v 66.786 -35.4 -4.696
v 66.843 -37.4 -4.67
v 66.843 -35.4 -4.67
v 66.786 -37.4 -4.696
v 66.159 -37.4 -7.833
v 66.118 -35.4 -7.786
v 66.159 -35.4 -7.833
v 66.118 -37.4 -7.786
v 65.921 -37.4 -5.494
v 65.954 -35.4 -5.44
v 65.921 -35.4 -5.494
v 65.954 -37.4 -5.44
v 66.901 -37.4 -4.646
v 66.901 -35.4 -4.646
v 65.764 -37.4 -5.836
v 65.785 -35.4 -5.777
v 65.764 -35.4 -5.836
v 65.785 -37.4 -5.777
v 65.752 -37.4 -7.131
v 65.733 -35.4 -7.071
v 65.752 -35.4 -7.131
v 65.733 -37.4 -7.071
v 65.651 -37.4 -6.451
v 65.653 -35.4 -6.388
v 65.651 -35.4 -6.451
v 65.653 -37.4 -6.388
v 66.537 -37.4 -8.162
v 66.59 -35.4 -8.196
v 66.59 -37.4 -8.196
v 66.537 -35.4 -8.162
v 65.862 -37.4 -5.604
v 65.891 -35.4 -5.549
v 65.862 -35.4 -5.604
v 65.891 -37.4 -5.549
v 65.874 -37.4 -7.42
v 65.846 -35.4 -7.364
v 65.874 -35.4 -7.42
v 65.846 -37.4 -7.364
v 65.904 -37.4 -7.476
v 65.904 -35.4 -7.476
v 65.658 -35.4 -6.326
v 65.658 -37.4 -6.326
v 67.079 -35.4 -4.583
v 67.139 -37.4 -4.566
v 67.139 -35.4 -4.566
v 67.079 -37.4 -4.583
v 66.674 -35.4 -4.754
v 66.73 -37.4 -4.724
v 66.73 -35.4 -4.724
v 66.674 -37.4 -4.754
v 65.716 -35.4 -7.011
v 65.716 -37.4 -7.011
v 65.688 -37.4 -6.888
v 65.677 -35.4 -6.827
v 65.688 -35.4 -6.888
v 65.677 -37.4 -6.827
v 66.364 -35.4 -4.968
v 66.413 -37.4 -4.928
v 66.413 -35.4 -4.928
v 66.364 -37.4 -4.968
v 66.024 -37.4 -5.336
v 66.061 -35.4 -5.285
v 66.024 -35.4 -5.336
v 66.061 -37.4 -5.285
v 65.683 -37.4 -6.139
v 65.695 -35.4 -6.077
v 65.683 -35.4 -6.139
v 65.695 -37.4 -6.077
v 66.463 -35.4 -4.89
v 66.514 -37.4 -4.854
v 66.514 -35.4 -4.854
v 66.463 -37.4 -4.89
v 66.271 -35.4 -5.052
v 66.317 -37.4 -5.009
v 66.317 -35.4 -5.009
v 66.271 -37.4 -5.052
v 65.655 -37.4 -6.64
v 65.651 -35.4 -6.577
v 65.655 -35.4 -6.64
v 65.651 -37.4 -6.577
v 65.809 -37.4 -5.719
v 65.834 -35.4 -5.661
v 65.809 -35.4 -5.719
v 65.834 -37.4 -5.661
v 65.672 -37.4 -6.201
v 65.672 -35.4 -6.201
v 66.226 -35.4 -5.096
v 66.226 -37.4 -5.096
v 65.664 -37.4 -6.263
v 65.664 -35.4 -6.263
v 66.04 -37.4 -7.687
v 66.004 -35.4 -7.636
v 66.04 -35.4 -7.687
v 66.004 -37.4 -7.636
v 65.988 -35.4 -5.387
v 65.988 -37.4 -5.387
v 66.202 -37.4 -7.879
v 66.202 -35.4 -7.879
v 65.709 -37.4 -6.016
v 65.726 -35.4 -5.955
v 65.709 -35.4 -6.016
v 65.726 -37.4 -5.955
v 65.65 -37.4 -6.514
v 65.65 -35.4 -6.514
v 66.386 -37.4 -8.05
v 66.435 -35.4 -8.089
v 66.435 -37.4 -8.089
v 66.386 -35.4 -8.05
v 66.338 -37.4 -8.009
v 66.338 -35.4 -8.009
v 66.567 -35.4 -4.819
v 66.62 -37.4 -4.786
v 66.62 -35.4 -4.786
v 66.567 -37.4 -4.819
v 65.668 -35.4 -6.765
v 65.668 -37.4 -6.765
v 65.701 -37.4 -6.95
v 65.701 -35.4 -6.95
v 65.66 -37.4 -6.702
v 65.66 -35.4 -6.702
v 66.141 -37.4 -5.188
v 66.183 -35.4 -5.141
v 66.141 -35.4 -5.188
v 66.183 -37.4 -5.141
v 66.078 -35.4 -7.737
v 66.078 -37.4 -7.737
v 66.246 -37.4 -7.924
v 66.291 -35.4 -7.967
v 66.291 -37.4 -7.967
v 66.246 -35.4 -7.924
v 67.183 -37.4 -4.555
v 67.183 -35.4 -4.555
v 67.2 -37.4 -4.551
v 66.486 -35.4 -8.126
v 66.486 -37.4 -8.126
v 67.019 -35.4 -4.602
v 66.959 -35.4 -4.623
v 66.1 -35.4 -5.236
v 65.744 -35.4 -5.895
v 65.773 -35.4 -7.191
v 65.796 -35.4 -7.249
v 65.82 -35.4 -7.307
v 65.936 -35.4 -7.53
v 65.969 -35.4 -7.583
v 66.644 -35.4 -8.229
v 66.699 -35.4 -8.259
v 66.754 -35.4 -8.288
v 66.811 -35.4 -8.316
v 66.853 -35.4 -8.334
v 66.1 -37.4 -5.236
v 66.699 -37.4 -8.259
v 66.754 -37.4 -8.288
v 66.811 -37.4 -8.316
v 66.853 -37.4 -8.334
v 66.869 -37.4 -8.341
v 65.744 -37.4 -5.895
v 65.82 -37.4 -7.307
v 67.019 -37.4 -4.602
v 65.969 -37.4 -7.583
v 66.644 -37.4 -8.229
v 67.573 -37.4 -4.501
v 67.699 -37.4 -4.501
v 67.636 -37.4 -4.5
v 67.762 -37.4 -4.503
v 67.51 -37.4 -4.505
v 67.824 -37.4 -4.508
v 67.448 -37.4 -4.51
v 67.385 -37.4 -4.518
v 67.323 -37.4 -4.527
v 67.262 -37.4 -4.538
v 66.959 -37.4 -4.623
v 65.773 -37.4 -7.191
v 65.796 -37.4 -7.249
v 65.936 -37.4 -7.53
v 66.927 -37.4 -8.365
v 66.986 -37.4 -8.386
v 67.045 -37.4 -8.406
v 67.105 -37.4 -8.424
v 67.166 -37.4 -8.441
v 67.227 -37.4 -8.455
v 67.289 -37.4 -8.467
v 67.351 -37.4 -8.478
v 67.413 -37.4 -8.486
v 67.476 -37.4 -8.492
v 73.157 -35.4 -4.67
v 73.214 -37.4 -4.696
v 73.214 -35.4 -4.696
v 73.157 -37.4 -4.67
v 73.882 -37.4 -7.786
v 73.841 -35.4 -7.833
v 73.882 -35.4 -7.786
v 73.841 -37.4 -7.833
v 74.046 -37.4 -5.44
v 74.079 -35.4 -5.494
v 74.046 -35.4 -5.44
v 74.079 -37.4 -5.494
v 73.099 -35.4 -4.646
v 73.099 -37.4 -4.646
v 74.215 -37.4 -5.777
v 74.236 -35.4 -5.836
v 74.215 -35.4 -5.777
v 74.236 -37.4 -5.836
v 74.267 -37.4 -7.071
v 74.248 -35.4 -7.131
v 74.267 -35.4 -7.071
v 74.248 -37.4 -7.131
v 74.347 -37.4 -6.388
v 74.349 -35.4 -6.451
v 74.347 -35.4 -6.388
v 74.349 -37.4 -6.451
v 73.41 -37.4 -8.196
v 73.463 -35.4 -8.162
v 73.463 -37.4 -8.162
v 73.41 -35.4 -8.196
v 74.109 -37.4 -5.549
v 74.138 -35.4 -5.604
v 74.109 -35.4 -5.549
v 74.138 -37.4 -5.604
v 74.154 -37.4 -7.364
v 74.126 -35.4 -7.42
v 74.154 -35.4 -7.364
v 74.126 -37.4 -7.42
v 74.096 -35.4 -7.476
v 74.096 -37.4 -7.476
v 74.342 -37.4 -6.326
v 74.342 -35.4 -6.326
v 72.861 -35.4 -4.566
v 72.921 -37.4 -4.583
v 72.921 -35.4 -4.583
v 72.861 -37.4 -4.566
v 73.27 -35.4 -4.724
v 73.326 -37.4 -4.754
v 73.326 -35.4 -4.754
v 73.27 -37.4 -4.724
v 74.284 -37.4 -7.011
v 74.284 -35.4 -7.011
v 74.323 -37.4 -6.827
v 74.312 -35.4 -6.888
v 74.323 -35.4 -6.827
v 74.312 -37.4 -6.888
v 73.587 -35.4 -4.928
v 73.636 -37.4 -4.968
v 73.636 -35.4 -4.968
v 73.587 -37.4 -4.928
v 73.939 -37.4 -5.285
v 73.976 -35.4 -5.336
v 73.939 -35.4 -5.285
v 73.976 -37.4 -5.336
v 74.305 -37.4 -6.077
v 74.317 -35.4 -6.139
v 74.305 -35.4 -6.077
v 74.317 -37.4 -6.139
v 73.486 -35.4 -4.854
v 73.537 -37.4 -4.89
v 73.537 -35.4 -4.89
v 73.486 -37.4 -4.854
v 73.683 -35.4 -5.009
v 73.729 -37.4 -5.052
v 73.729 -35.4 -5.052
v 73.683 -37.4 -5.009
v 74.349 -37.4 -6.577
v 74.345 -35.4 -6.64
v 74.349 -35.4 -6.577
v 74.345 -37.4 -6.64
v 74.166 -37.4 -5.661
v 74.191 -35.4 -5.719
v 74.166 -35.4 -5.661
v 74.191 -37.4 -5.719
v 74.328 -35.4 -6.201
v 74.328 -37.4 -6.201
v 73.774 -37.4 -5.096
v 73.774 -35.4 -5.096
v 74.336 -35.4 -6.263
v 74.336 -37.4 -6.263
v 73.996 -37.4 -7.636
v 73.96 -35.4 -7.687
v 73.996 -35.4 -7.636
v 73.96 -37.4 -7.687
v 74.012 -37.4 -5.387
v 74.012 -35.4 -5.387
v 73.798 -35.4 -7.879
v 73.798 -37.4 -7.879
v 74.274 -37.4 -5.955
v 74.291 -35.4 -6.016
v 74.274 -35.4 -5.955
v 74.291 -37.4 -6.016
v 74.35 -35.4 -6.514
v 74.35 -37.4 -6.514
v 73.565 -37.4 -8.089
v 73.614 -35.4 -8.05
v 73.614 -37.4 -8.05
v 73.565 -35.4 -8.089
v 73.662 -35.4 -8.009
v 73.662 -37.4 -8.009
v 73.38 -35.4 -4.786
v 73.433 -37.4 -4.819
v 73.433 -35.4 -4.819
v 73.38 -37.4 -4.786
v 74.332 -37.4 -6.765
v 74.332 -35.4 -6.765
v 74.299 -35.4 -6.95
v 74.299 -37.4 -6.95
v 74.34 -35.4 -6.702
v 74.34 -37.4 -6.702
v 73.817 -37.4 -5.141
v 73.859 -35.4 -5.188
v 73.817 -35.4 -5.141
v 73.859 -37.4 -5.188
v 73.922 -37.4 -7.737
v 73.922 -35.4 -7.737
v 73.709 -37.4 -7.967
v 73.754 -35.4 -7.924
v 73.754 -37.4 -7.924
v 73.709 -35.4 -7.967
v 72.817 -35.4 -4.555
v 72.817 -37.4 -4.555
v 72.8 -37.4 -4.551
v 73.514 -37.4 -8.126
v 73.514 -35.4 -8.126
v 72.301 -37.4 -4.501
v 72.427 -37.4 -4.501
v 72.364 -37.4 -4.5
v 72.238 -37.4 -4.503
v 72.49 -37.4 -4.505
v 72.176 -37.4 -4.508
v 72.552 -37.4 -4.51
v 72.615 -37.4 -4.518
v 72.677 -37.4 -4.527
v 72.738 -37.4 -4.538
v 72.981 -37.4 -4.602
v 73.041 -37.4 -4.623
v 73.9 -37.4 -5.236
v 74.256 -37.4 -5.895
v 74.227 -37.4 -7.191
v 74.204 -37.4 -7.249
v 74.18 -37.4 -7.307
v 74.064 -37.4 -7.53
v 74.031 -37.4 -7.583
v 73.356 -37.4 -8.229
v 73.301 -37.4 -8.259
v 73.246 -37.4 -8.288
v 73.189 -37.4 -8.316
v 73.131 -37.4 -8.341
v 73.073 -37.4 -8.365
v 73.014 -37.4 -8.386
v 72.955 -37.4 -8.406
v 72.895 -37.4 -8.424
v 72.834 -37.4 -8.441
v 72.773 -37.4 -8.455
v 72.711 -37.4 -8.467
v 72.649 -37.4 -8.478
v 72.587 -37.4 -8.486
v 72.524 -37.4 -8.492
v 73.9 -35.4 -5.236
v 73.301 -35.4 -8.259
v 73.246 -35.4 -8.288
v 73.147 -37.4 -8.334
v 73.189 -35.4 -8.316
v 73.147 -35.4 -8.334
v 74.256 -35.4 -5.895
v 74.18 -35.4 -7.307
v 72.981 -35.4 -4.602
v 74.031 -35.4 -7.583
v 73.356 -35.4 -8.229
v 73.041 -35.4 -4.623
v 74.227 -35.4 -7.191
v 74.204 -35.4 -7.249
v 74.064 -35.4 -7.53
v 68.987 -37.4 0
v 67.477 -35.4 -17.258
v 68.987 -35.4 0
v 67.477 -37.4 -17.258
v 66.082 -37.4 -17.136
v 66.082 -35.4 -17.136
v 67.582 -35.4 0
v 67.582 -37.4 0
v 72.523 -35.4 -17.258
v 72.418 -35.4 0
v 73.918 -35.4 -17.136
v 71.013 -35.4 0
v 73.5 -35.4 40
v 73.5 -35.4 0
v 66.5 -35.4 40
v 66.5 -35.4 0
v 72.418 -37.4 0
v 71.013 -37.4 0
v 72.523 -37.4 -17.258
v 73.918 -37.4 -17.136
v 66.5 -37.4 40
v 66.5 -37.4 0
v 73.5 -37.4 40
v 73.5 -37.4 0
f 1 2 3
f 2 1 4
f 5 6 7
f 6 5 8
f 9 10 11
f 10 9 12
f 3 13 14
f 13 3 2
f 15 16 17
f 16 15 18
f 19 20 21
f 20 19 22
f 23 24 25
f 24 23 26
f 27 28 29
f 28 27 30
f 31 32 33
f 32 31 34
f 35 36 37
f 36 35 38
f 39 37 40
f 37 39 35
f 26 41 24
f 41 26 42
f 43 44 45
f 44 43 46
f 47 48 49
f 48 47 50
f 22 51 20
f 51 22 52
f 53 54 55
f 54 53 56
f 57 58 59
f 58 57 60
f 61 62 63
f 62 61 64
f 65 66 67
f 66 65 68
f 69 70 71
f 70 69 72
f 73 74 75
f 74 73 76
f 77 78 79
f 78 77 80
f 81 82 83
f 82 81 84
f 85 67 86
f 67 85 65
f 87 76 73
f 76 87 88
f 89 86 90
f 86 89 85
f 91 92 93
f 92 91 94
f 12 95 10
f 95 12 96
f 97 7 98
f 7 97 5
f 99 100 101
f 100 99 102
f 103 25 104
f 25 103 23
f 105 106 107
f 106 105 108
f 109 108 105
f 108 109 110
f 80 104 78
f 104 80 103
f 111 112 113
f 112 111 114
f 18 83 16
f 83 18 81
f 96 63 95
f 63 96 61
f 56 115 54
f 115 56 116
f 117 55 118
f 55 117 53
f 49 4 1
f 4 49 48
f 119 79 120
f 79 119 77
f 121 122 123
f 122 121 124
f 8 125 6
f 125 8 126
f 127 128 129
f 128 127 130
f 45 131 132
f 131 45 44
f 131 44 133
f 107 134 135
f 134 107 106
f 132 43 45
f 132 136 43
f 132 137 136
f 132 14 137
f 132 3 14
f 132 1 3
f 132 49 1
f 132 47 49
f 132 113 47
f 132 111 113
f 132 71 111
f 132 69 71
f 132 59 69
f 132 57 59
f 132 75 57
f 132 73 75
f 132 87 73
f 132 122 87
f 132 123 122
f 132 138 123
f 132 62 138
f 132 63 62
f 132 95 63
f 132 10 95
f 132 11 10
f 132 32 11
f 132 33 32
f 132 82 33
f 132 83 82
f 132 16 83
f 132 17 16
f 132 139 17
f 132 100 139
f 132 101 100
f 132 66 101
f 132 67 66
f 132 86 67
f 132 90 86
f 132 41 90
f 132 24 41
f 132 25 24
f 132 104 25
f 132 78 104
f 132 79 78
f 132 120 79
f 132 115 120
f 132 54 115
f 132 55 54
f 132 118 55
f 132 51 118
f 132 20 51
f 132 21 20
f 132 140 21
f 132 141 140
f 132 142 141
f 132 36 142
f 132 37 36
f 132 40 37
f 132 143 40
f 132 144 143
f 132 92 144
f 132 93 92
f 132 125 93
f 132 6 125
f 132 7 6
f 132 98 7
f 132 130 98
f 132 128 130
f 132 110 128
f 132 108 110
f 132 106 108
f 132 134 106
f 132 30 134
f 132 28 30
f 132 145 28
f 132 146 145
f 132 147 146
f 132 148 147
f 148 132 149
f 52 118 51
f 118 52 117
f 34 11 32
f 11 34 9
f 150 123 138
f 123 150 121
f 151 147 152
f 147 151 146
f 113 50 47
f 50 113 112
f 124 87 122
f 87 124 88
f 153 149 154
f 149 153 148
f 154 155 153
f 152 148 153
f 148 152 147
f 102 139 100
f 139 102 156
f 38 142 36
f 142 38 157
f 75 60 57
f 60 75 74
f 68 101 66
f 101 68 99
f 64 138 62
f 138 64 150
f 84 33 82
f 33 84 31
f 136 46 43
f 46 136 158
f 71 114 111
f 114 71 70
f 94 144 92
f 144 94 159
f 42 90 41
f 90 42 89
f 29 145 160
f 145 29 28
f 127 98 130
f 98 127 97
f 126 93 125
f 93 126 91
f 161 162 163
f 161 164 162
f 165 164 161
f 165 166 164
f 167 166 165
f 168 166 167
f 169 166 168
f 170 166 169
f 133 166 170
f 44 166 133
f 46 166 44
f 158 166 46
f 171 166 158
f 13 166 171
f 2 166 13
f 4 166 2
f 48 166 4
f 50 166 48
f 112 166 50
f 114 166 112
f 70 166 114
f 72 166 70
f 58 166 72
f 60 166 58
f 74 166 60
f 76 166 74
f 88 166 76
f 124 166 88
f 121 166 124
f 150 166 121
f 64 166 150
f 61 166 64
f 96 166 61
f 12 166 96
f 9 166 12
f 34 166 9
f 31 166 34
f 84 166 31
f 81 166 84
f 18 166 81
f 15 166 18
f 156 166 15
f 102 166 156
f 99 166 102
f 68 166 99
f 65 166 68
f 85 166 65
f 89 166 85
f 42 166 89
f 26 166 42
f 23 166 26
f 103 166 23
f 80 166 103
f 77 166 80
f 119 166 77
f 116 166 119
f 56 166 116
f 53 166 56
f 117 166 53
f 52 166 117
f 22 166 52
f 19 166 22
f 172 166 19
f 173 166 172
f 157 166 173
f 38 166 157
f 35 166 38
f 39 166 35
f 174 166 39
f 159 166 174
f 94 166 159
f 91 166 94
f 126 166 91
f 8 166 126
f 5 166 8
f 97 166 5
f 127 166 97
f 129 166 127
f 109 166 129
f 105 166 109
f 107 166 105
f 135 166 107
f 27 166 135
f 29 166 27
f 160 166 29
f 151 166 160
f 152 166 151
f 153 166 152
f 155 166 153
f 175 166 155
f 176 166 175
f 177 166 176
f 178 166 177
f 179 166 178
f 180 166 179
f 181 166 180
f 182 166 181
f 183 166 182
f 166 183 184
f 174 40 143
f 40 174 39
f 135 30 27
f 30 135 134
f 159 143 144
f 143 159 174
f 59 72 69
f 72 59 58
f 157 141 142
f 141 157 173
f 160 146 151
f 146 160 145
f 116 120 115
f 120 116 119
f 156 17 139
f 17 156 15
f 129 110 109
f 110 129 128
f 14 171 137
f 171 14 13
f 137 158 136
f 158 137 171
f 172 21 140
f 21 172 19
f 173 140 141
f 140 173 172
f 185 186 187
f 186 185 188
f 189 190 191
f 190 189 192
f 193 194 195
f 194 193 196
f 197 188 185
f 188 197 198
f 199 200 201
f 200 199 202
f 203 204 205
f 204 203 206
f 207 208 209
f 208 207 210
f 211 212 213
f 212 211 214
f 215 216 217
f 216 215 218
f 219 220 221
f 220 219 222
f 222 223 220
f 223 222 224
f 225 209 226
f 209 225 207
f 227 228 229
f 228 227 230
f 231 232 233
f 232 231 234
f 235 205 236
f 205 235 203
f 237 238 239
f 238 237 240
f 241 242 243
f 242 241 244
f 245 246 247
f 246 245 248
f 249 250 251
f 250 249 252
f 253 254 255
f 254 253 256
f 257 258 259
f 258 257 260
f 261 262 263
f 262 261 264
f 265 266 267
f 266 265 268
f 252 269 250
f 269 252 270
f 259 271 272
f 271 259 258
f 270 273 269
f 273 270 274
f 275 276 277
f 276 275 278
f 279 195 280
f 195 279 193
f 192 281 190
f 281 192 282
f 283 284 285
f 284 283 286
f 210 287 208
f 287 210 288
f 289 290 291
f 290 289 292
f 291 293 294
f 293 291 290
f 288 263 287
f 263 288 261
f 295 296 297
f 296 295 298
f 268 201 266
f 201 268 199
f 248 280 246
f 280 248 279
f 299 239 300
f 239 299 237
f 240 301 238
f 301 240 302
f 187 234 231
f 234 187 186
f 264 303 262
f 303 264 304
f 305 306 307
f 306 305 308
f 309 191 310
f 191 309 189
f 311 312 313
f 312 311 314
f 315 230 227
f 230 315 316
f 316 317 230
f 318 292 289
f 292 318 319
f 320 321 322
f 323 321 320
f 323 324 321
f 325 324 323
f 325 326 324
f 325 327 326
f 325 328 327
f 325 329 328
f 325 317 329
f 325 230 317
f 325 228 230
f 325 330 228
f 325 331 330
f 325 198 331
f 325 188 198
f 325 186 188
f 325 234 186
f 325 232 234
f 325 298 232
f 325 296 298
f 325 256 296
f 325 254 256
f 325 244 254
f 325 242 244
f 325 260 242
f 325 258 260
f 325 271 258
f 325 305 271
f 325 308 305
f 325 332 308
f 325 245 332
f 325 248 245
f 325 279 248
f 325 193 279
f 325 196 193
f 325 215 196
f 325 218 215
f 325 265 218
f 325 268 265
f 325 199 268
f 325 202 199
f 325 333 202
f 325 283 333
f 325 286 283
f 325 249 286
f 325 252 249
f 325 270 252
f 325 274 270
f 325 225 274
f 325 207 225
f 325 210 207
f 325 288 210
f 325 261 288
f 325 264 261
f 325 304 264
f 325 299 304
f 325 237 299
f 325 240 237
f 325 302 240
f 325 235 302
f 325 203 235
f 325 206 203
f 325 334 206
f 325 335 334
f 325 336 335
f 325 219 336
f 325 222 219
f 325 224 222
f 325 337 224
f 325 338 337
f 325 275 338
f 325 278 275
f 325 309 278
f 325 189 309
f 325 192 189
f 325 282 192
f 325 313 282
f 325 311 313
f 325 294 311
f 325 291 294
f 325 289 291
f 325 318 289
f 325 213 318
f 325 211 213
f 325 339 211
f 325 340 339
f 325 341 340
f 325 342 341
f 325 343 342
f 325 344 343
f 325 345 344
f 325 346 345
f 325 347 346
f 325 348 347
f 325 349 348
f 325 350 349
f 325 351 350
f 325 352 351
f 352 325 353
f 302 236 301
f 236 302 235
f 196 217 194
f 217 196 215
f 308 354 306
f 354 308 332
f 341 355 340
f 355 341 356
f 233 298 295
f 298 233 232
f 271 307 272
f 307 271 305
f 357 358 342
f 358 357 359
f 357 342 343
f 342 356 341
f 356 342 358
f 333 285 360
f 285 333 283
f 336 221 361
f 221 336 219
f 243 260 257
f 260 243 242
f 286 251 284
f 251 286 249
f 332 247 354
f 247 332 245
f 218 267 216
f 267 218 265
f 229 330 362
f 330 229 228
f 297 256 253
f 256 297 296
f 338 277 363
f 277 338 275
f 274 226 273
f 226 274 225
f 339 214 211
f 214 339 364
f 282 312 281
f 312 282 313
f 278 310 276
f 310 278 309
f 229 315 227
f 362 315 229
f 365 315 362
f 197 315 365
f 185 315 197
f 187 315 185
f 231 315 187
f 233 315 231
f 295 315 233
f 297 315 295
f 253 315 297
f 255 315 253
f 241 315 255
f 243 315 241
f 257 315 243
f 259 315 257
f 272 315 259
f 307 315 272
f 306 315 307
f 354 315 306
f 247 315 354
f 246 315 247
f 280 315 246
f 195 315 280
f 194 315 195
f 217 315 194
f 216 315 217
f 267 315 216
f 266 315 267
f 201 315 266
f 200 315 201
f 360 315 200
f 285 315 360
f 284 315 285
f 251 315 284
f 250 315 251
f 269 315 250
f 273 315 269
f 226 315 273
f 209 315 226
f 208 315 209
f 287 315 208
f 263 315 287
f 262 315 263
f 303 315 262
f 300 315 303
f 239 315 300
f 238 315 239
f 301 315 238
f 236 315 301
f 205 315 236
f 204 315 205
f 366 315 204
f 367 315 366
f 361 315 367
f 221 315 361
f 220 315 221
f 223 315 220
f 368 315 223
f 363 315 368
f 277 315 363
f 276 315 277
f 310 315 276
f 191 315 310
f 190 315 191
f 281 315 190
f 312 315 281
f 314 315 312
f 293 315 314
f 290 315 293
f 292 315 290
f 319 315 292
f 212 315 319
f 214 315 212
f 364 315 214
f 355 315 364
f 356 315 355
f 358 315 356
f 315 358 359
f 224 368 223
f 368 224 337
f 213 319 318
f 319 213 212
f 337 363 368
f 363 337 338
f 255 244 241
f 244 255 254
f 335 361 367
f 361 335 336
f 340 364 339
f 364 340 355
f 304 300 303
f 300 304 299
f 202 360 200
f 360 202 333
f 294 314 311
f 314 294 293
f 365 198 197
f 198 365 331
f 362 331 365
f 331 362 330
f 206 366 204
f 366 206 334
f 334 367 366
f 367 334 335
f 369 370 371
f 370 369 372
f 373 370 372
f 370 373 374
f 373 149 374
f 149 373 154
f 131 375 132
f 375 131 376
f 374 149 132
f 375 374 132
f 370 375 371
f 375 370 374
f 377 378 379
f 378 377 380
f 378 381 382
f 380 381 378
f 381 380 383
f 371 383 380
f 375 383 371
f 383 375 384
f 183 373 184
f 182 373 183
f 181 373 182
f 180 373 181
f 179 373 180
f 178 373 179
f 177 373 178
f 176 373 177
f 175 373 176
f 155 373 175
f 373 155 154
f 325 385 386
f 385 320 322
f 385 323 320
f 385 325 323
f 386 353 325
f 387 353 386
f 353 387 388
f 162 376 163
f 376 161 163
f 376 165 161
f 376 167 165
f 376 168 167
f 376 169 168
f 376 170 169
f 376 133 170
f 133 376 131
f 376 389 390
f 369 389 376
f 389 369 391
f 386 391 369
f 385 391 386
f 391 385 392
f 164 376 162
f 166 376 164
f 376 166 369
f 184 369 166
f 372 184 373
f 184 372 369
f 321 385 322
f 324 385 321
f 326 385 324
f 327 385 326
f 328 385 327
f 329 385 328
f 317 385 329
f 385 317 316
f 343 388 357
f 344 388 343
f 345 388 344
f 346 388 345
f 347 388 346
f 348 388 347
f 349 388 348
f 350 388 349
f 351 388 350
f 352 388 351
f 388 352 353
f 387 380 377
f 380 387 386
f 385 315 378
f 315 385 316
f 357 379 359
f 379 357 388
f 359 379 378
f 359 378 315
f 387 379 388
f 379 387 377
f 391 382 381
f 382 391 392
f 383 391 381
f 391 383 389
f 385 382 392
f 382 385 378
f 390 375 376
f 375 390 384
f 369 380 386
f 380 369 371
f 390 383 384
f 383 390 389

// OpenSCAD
bitting = [3,4,8,3,7];

tol = 0.7;

plug_r = 12.5;

pin_r = 2;
pin_s = 4;

keyway_w = 5;
keyway_h = 17;

key_handle_r = 17;
key_hole_r = 3;

key_thickness = keyway_w-(2*tol);

tooth_space = keyway_h/2-tol;
tooth_unit = tooth_space/10;

pins = len(bitting);

key_channel_w = 2;
key_channel_off = 3;

clip_channel_w = 7;
clip_channel_d = 2;
clip_channel_off = 6;

plug_h = (((2*pin_r)+pin_s) * pins) + clip_channel_w + clip_channel_off;
back_h = clip_channel_w + clip_channel_off;
front_h = plug_h - back_h;

plug_t = 2; // plug thickness (amount the cutouts should leave around outside of pins & plug)

section_h = (2*pin_r)+pin_s;

teeth_h = pins * section_h;

casing_thickness = 3;
casing_ir = plug_r + tol;
casing_or = casing_ir + casing_thickness;

casing_stack_h = 25;
casing_stack_thickness = 10;
casing_stack_w = pin_r+(tol/2)+casing_stack_thickness;

spring_r = 2;

lid_thickness = 3;
clip_strut_w = 1.3;

module half_cylinder(radius, height) {
	difference() {
		cylinder($fn=200, r=radius, h=height, center=true);
		translate([radius,0,0]) cube([2*radius,2*radius,2*height], center=true);
	}
}

module ring(or, ir, height) {
	difference() {
		cylinder($fn=200, r=or, h=height, center=true);
		cylinder($fn=200, r=ir, h=height+2, center=true);
	}
}

module plug_section(plug_r, pin_r, pin_s, keyway_w, keyway_h, key_channel_w, key_channel_off) {
    difference() {
        cylinder($fn=200,r=plug_r, h=section_h,center=true);
        rotate([90,0,0]) translate([0,0,plug_r/2]) cylinder($fn=200,r=pin_r+tol,h=1.5*plug_r,center=true);
		translate([(plug_r/2)+pin_r-tol,0,0]) cube([plug_r,plug_r,pin_r], center=true);
		translate([-(plug_r/2)-pin_r+tol,0,0]) cube([plug_r,plug_r,pin_r], center=true);
    }
}

module plug_cutouts () {
    difference() {
        cylinder($fn=200, r=plug_r-(clip_channel_d/2)-plug_t, h=plug_h+2, center=true);
        cube([keyway_w + (2*plug_t), 2*plug_r, plug_h+4],center=true);
    }
}

module plug() {
    difference() {
        union() {
            translate([0,0,(pin_r)+(pin_s/2)]) {
                for(i = [0:pins-1]) {
                    translate([0,0,i*section_h]) plug_section(plug_r, pin_r, pin_s, keyway_w, keyway_h, key_channel_w, key_channel_off);
                }
            }
            translate([0,0,0-(clip_channel_w/2)]) cylinder($fn=200,h=clip_channel_w, r=plug_r-(clip_channel_d/2), center=true);
            translate([0,0,0-(clip_channel_w)-(clip_channel_off/2)]) cylinder($fn=200,h=clip_channel_off, r=plug_r, center=true);
        }
        translate([0,0,plug_h/2-back_h]) cube([keyway_w, keyway_h, plug_h+2],center=true);
        translate([0,0,back_h-1]) plug_cutouts();
    }
    translate([0-(keyway_w/2)+(key_channel_w/2),(keyway_w/4)+key_channel_off,plug_h/2-back_h]) cube([key_channel_w, keyway_w/2, plug_h],center=true);
}

module key_blank() {
	difference() {
		translate([0,0,front_h+key_handle_r+0.5]) rotate([0,90,0]) cylinder($fn=200,r=key_handle_r, h=key_thickness, center=true);
		translate([0,0,front_h+(2*key_handle_r)-(2*key_hole_r)]) rotate([0,90,0]) cylinder($fn=200,r=key_hole_r, h=key_thickness+2, center=true);
	}
	difference(){
		union() {
			translate([0,keyway_h/4-tol/2,plug_h/2-pin_s/4]) cube([key_thickness, keyway_h/2-tol, plug_h],center=true);
			translate([0,keyway_h/4-tol/2,-pin_s/4]) rotate([0,90,0]) cylinder($fn=200, h=key_thickness, r=keyway_h/4-tol/2, center=true);
		}
		translate([0-(keyway_w/2)+(key_channel_w/2),(keyway_w/4)+key_channel_off,plug_h/2]) cube([key_channel_w/2+(4*tol),keyway_w/2+(2*tol),1.75*plug_h],center=true);
	}
	translate([0,0,front_h+(key_handle_r/4+pin_s/2)/2+tol]) cube([key_thickness, keyway_h+(2*tol), key_handle_r/4+pin_s/2],center=true);
}

module key_teeth() {
	translate([0,0,-pin_s/4]) rotate([0,-90,0]) linear_extrude(height=key_thickness, center=true, twist=0) polygon(points=[[0,0],[pin_s-pin_r/2,-(bitting[0]*tooth_unit)],[pin_s-pin_r/2,0]]);
	for(i=[1:pins]) {
		translate([0,-((bitting[(i-1)]*tooth_unit)/2),((i-1)*section_h)+(section_h/2)]) cube([key_thickness,bitting[(i-1)]*tooth_unit,2*pin_r],center=true);
		if (i < (pins)) {
			translate([0,0,((i-1)*section_h)+(section_h/2)+pin_s/2]) rotate([0,-90,0]) linear_extrude(height=key_thickness, center=true, twist=0) polygon(points=[[0,0],[0,-bitting[i-1]*tooth_unit],[section_h-(2*pin_r),-bitting[i]*tooth_unit],[section_h-(2*pin_r),0]]);
		}
	}
	translate([0,0,((pins-1)*section_h)+(section_h/2)+pin_s/4+pin_r/2]) rotate([0,-90,0]) linear_extrude(height=key_thickness, center=true, twist=0) polygon(points=[[0,0],[0,-bitting[pins-1]*tooth_unit],[section_h-(3*pin_r)+tol,-tooth_space],[section_h-(3*pin_r)+tol,0]]);
}

module key() {
	key_teeth();
	key_blank();
}

module key_pin(pin_num) {
	translate([0,-(plug_r/2)-(bitting[pin_num]*tooth_unit)/2-pin_r/2,section_h/2]) {
		rotate([90,0,0]) {
			translate([0,0,-(tol/2)]) cylinder($fn=200, r=pin_r, h=plug_r-(bitting[pin_num]*tooth_unit)-(1.5*pin_r)+tol/2,center=true); 
			translate([0,0,-((plug_r-(bitting[pin_num]*tooth_unit)-(pin_r))/2)]) sphere($fn=200,r=pin_r);
		}
	}
}

module key_pins() {
	for (i = [0:pins-1]) {
		translate([0,-tol,(i*section_h)]) key_pin(i);
	}
}	

module driver_pin() {
	translate([0,tol-casing_ir-((casing_thickness+casing_stack_h/2)/2),section_h/2]) rotate([90,0,0]) cylinder($fn=200, r=pin_r, h=casing_thickness+(casing_stack_h/2), center=true);
}

module driver_pins() {
	for (i = [0:pins-1]) {
		translate([0,-(1.5*tol),(i*section_h)]) driver_pin();
	}	
}

module casing_section() {
	translate([0,0,section_h/2]) {
		difference() {
			union() {
				cylinder($fn=200,r=casing_or, h=section_h,center=true);
				translate([0,tol-(casing_stack_h/2)-casing_or+tol,0]) cube([casing_stack_w, casing_stack_h, section_h], center=true);
			}
			cylinder($fn=200,r=casing_ir, h=section_h+2,center=true);
			rotate([90,0,0]) translate([0,0,casing_stack_h]) cylinder($fn=200,r=pin_r+tol,h=casing_stack_h+casing_or+2,center=true);
			
			// Cutouts so you can see the lock working
			translate([(casing_or/2)+pin_r-tol,0,0]) cube([casing_or,(2*casing_or)+(casing_stack_h/2),pin_r-(tol/2)], center=true);
			translate([-(casing_or/2)-pin_r+tol,0,0]) cube([casing_or,(2*casing_or)+(casing_stack_h/2),pin_r-(tol/2)], center=true);
		}
	}
}

module casing_back() {
	// Casing Ring
	translate([0,0,-back_h/2]) ring(casing_or, casing_ir, back_h);
	// Casting Stack
	translate([0,(2*tol)-(casing_stack_h/2)-casing_or,-back_h/2]) cube([pin_r+(tol/2)+casing_stack_thickness, casing_stack_h, back_h+tol/2], center=true);
	// Retaining ring for the plug
	translate([0,0,-(clip_channel_w-(2*tol))/2-tol]) ring(casing_ir+tol, plug_r-tol, clip_channel_w-(2*tol));
}

module casing_blank() {
	for(i = [0:pins-1]) {
		translate([0,0,(i*section_h)]) casing_section();
    }
	casing_back();
}

module casing() {
	difference() {
		casing_blank();
		translate([0,(2*tol)-casing_or-casing_stack_h+clip_channel_d/2,plug_h/2-back_h]) cube([pin_r+(2*tol),clip_channel_d+(3*tol)+clip_channel_off,plug_h+2], center=true);
		translate([0,(2*tol)-casing_or-casing_stack_h+2*tol+clip_channel_d,plug_h/2-back_h]) rotate([0,0,90]) cube([clip_channel_d+(2*tol),clip_channel_w+(2*tol),plug_h+2], center=true);
		translate([-spring_r,(2*tol)-casing_or-casing_stack_h+2*tol+clip_channel_d,-back_h/2]) rotate([90,0,0]) half_cylinder(spring_r+tol,clip_channel_d+(2*tol));
		translate([spring_r,(2*tol)-casing_or-casing_stack_h+2*tol+clip_channel_d,-back_h/2]) rotate([90,0,180]) half_cylinder(spring_r+tol,clip_channel_d+(2*tol));
	}
}

module clip_strut(){
	translate([-spring_r-tol/2,(2*tol)-casing_or-casing_stack_h+2*tol+clip_channel_d,-back_h/2]) rotate([90,5,0]) half_cylinder(spring_r,clip_channel_d);
	translate([spring_r+tol/2,(2*tol)-casing_or-casing_stack_h+2*tol+clip_channel_d,-back_h/2]) rotate([90,5,180]) half_cylinder(spring_r,clip_channel_d);
	translate([-2,(2*tol)-casing_or-casing_stack_h+2*tol+clip_channel_d,-back_h/4]) rotate([0,5,0]) cube([1.4,clip_channel_d,2*back_h+2], center=true);
	translate([2,(2*tol)-casing_or-casing_stack_h+2*tol+clip_channel_d,-back_h/4]) rotate([0,-5,0]) cube([1.4,clip_channel_d,2*back_h+2], center=true);
}

module lid() {
	// Clip Strut
	clip_strut();
	// Main Lid Section
	translate([0,(2*tol)-casing_or-casing_stack_h+2*tol+clip_channel_d,front_h/2]) cube([clip_channel_w,clip_channel_d,front_h], center=true);
}

// translate([-50,0,0]) key();
// translate([-40,0,0]) key_pins();
// translate([-30,0,0]) driver_pins();
// translate([0,0,0]) plug();
// translate([50,0,0]) casing();
translate([70,0,0]) lid();
